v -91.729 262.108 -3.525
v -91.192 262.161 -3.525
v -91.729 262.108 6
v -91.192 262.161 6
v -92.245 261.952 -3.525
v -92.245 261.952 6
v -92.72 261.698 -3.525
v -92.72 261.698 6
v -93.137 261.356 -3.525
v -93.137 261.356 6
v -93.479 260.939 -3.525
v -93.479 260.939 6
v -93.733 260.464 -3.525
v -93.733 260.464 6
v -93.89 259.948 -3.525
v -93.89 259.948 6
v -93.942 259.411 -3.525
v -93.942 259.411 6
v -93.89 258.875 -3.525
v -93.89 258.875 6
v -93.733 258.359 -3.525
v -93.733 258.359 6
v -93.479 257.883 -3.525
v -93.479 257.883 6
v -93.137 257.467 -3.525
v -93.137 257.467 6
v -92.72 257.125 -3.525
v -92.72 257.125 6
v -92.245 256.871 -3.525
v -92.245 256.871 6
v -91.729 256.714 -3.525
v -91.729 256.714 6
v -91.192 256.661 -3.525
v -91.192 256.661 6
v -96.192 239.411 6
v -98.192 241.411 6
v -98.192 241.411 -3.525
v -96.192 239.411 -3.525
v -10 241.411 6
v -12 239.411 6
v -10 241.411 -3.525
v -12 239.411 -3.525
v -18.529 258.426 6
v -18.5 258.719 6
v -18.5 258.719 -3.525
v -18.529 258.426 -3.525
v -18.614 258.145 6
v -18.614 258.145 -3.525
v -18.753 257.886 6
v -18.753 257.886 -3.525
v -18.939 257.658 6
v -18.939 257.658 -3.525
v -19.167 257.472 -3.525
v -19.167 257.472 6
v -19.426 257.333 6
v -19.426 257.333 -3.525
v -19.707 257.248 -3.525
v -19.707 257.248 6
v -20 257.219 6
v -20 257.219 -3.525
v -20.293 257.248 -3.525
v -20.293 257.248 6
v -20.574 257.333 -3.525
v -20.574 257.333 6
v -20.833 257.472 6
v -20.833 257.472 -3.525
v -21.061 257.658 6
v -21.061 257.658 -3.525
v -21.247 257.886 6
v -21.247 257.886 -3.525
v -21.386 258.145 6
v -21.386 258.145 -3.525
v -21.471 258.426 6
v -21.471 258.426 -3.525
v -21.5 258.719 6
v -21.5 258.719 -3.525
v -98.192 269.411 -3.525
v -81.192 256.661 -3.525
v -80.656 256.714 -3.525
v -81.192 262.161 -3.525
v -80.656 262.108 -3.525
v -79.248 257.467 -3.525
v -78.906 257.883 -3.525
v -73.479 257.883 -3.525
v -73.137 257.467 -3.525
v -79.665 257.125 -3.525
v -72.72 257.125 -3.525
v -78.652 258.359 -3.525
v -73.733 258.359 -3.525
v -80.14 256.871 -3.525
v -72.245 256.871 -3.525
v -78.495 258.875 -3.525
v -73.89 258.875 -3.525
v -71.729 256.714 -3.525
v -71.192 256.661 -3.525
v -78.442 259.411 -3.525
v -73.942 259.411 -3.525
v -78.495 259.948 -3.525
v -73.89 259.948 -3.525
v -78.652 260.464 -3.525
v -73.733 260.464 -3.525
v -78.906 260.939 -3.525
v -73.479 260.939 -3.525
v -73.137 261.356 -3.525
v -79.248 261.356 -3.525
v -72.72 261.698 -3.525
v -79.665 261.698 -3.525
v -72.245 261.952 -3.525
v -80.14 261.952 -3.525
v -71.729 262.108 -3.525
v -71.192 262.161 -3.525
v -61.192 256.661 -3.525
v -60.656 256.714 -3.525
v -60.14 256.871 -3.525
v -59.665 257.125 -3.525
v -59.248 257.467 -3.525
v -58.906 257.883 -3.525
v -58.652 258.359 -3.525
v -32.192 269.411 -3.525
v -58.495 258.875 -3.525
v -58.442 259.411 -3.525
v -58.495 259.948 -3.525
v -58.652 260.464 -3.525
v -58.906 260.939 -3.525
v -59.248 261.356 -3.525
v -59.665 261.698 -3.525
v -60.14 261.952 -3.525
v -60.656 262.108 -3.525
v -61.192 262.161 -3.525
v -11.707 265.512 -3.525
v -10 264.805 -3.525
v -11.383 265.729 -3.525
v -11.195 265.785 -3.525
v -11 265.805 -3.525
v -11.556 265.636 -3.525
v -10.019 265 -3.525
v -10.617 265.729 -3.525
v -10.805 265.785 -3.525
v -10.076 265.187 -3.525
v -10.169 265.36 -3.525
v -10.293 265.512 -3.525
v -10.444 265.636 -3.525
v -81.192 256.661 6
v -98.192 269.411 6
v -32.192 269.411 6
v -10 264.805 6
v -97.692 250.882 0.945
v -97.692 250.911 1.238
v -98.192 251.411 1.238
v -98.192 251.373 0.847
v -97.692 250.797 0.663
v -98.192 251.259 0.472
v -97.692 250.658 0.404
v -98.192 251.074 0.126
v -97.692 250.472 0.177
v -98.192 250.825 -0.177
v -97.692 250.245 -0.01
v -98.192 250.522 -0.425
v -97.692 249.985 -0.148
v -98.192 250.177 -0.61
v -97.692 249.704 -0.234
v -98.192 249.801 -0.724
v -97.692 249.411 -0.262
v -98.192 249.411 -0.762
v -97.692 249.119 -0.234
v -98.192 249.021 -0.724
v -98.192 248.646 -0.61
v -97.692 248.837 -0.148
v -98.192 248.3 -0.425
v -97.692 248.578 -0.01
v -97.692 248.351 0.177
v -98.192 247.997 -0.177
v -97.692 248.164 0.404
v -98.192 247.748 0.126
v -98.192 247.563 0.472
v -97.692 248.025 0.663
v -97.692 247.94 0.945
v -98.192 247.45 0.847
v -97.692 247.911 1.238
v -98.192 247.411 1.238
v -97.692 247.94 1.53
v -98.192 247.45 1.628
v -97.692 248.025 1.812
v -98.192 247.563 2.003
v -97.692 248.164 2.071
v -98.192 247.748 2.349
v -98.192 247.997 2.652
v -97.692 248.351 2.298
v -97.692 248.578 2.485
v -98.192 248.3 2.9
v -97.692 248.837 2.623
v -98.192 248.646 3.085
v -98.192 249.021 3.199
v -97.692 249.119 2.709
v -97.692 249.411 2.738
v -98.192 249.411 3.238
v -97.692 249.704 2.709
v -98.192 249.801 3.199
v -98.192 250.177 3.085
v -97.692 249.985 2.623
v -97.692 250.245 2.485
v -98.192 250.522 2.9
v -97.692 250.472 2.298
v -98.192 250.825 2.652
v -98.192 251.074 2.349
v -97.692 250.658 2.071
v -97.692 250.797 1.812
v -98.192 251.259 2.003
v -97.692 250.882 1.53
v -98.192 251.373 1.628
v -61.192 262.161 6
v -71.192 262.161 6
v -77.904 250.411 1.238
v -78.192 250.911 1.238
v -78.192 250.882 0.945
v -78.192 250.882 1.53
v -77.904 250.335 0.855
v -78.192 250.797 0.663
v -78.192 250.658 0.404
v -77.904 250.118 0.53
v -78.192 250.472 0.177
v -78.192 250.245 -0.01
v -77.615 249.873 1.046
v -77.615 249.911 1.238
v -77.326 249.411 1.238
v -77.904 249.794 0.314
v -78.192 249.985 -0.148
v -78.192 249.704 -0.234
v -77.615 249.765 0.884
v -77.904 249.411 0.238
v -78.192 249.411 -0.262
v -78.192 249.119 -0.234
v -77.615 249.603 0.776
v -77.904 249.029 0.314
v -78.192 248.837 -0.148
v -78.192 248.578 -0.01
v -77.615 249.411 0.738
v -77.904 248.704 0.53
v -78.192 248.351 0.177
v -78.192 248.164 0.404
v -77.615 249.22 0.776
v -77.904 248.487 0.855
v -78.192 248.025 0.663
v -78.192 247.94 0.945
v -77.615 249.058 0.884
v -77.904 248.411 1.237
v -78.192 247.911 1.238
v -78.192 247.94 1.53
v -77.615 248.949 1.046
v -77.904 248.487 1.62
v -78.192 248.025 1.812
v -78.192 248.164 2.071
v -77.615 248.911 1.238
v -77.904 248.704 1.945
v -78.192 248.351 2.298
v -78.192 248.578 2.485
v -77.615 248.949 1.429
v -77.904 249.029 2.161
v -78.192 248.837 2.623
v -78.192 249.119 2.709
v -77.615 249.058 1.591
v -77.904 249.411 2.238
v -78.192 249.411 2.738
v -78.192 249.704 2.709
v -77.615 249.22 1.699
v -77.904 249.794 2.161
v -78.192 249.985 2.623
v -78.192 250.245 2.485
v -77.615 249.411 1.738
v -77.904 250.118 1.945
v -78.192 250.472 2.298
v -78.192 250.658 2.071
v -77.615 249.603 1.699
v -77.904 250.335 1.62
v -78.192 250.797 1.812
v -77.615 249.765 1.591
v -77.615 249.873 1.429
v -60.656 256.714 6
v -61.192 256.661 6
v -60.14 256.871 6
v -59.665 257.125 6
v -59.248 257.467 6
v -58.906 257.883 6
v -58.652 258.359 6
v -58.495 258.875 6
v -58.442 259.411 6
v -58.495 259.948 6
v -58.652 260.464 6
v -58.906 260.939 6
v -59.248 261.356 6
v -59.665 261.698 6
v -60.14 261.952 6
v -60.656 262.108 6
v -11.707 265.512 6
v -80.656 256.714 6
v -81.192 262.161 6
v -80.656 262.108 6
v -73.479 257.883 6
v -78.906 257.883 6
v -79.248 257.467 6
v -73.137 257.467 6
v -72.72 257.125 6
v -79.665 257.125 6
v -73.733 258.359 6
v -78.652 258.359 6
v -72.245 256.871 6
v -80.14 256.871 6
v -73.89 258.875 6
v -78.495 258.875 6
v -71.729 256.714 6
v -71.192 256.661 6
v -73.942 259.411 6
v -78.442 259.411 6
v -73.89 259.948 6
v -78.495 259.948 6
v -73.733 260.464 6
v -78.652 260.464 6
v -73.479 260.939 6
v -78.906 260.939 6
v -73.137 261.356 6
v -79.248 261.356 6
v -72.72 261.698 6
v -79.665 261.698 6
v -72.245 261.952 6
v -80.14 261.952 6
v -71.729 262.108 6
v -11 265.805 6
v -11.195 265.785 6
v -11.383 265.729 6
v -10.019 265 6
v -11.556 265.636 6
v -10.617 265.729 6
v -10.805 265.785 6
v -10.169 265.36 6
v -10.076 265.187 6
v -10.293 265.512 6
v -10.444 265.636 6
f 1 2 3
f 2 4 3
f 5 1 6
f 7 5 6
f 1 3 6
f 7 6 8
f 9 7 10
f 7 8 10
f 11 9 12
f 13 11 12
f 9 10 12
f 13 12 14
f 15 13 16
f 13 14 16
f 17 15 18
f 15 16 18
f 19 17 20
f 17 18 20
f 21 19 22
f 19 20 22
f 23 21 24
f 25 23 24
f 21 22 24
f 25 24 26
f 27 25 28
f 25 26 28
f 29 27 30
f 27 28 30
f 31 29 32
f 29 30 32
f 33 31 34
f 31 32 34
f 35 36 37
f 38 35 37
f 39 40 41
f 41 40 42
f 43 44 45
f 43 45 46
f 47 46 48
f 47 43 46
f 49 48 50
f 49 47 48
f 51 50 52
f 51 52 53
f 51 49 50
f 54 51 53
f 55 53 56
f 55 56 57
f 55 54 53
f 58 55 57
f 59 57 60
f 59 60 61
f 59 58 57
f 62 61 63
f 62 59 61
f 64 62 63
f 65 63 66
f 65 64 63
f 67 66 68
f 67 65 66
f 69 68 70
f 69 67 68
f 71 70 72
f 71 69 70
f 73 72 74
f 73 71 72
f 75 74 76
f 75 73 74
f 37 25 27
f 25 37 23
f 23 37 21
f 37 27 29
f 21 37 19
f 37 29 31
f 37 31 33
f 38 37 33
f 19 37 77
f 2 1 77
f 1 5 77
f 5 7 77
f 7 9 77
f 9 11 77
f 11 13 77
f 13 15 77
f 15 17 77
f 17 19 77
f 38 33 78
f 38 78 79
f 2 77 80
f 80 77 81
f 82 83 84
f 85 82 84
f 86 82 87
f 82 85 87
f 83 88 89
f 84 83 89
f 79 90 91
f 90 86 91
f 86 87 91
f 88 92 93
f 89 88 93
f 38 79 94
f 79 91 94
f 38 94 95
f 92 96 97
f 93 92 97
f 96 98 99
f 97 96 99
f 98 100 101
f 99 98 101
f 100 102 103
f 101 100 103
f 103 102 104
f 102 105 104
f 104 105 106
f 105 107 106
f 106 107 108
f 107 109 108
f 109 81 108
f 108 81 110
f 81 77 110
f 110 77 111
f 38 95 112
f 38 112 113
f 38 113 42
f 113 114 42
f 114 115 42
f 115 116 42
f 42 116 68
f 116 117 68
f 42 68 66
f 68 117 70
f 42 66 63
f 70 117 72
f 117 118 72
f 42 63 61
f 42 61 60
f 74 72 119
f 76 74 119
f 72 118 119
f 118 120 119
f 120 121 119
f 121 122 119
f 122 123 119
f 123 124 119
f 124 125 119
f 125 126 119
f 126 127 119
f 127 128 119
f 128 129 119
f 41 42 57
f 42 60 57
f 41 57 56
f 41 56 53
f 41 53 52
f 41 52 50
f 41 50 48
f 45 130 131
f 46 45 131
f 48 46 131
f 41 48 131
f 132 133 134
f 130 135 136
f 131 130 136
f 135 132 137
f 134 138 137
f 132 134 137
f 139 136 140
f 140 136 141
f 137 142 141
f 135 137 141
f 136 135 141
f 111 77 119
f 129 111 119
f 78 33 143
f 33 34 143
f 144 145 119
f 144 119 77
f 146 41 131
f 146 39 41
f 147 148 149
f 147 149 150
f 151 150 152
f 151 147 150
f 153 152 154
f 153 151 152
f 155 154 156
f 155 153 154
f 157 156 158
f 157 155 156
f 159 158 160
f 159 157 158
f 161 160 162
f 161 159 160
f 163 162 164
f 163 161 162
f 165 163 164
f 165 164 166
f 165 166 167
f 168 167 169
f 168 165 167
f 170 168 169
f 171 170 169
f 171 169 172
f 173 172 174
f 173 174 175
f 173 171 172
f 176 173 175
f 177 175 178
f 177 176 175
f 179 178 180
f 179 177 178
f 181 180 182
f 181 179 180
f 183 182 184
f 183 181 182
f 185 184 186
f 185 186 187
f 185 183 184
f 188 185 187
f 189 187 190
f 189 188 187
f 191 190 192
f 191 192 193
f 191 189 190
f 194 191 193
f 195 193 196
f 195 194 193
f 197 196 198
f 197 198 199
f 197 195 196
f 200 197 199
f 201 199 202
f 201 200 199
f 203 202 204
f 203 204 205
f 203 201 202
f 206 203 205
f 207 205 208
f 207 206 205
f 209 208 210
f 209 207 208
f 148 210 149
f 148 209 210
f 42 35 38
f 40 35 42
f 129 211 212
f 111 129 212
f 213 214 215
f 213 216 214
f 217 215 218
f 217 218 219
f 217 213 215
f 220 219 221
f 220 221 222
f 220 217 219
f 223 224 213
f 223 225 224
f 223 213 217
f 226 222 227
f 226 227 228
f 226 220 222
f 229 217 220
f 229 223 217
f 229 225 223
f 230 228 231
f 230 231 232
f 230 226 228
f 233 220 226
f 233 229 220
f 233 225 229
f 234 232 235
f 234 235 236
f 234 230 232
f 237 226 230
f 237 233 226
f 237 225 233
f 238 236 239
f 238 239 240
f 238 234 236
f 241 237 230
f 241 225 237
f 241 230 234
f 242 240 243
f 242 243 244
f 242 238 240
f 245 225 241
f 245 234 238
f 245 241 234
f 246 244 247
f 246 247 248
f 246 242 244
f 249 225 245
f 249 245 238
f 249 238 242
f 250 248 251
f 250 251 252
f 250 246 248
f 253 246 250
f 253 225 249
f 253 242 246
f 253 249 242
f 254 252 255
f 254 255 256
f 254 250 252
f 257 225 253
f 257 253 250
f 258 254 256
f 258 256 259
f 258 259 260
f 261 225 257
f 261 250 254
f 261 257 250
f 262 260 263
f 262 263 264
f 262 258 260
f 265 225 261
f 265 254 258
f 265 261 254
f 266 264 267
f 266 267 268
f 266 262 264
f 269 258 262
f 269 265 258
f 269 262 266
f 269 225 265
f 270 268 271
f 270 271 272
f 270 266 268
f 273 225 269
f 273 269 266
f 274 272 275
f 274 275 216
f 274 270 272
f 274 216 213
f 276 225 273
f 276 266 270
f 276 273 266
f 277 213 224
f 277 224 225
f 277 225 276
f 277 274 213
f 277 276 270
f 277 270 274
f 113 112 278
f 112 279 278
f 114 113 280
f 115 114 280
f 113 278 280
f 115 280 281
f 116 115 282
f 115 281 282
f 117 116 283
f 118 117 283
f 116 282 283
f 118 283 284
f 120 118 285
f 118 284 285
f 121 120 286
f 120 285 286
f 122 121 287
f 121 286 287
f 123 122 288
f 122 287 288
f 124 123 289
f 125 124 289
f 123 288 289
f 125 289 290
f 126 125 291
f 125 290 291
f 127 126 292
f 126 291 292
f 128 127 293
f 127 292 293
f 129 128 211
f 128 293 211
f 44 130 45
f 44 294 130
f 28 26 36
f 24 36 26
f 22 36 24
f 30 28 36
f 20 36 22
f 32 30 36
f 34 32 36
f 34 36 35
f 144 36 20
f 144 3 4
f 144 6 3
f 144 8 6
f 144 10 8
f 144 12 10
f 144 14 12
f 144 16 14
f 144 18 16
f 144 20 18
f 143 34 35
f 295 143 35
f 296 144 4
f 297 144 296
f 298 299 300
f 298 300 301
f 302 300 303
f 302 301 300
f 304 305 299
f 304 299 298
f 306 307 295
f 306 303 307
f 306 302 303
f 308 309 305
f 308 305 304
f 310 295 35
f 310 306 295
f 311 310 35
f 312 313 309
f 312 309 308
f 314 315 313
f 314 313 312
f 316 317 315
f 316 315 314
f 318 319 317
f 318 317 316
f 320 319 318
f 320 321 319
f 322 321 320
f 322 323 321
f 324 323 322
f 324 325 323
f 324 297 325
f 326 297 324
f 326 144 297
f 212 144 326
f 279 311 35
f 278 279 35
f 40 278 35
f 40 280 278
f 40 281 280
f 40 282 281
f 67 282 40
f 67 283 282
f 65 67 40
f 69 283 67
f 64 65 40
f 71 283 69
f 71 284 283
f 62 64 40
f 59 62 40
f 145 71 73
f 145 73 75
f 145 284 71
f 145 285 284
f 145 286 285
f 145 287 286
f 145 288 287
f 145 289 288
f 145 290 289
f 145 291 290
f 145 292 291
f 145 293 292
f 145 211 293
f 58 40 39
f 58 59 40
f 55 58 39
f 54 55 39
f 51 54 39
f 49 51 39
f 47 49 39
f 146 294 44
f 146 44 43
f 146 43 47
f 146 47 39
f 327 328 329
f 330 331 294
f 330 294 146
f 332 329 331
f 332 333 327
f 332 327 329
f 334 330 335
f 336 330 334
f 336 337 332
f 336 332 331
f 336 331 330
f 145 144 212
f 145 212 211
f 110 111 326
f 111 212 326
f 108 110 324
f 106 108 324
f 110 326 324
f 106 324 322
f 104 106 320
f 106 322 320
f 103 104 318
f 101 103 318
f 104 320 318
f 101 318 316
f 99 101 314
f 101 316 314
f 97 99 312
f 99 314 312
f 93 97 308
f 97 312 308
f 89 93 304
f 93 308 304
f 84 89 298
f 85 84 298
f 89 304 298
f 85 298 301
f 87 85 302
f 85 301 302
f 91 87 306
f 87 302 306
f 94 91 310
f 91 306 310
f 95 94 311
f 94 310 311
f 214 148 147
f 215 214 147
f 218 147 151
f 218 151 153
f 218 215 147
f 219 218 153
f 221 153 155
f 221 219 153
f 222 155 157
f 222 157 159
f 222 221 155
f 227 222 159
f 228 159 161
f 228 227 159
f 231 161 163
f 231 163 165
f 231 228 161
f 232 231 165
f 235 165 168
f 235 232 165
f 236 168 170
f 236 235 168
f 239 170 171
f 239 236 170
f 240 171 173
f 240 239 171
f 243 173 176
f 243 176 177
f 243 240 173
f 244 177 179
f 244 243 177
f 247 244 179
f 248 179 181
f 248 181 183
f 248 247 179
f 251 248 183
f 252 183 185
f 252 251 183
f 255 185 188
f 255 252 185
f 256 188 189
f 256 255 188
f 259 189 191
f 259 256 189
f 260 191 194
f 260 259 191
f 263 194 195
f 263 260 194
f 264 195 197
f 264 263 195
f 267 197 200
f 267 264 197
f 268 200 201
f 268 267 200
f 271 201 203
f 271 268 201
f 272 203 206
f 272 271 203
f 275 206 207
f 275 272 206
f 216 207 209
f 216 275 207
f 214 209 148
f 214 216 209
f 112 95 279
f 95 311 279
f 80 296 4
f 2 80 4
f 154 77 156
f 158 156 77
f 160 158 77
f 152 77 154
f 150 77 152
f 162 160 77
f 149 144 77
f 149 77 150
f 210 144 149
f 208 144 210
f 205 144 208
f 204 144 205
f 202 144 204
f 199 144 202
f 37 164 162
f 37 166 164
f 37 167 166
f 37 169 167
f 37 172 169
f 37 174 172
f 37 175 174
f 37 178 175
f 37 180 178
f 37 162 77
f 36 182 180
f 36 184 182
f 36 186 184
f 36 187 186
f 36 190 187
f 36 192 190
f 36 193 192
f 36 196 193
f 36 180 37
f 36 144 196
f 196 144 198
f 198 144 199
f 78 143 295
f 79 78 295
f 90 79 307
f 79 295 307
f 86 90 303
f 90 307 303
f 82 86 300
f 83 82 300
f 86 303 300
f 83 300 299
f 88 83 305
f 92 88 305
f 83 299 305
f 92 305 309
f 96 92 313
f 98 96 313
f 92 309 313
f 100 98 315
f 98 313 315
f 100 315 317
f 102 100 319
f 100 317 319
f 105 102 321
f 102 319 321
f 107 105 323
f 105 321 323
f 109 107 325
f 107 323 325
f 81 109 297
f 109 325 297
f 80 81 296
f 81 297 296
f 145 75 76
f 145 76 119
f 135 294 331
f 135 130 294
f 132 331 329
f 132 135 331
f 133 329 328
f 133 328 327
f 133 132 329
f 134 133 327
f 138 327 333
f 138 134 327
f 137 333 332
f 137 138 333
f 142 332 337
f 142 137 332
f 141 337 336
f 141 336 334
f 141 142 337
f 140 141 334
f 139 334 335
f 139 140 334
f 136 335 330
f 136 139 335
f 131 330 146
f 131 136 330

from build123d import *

# Parameters (mm, degrees)
BOSS_EXTRUDE1_DEPTH      = 6
BOSS_EXTRUDE1_DEPTH_BACK = 3.525
FILLET1_R                = 1
CHAMFER1_SIZE            = 2
CHAMFER2_SIZE            = 0.5


with BuildPart() as part:
    # Sketch1 → Boss-Extrude1 (new body, two sides)
    with BuildSketch(Plane.XY) as boss_extrude1_sk:
        with BuildLine():
            Line((-10, 267.218866814), (-18.5, 258.718866814))
            ThreePointArc((-18.5, 258.718866814), (-20, 257.218866814), (-21.5, 258.718866814))
            Line((-21.5, 258.718866814), (-32.192388155, 269.41125497))
            Line((-32.192388155, 269.41125497), (-98.192388155, 269.41125497))
            Line((-98.192388155, 269.41125497), (-98.192388155, 239.41125497))
            Line((-98.192388155, 239.41125497), (-10, 239.41125497))
            Line((-10, 239.41125497), (-10, 267.218866814))
        make_face()
        with BuildLine():
            Line((-81.192388155, 262.16125497), (-91.192388155, 262.16125497))
            ThreePointArc((-91.192388155, 262.16125497), (-93.942388155, 259.41125497), (-91.192388155, 256.66125497))
            Line((-91.192388155, 256.66125497), (-81.192388155, 256.66125497))
            ThreePointArc((-81.192388155, 256.66125497), (-78.442388155, 259.41125497), (-81.192388155, 262.16125497))
        make_face(mode=Mode.SUBTRACT)
        with BuildLine():
            Line((-61.192388155, 262.16125497), (-71.192388155, 262.16125497))
            ThreePointArc((-71.192388155, 262.16125497), (-73.942388155, 259.41125497), (-71.192388155, 256.66125497))
            Line((-71.192388155, 256.66125497), (-61.192388155, 256.66125497))
            ThreePointArc((-61.192388155, 256.66125497), (-58.442388155, 259.41125497), (-61.192388155, 262.16125497))
        make_face(mode=Mode.SUBTRACT)
    extrude(amount=BOSS_EXTRUDE1_DEPTH)
    extrude(boss_extrude1_sk.sketch, amount=-BOSS_EXTRUDE1_DEPTH_BACK)

    # Fillet1
    fillet1_edges = [part.edges().sort_by_distance(p)[0] for p in [
        (-10, 267.218866814, 1.2375),
    ]]
    fillet(fillet1_edges, radius=FILLET1_R)

    # Chamfer1
    chamfer1_edges = [part.edges().sort_by_distance(p)[0] for p in [
        (-10, 239.41125497, 1.2375),
        (-98.192388155, 239.41125497, 1.2375),
    ]]
    chamfer(chamfer1_edges, length=CHAMFER1_SIZE)

    # Sketch3 → Cut-Revolve1 (revolve, cut)
    with BuildSketch(Plane(origin=(0, 0, 1.2375), x_dir=(-1, 0, 0), z_dir=(0, 0, -1))):
        Polygon((98.192388155, 250.91125497), (78.192388155, 250.91125497), (77.326362752, 249.41125497), (98.192388155, 249.41125497), align=None)
    revolve(axis=Axis((-98.192388155, 249.41125497, 1.2375), (-1, 0, 0)), mode=Mode.SUBTRACT)

    # Chamfer2
    chamfer2_edges = [part.edges().sort_by_distance(p)[0] for p in [
        (-98.192388155, 247.91125497, 1.2375),
    ]]
    chamfer(chamfer2_edges, length=CHAMFER2_SIZE)


solid = part.part
